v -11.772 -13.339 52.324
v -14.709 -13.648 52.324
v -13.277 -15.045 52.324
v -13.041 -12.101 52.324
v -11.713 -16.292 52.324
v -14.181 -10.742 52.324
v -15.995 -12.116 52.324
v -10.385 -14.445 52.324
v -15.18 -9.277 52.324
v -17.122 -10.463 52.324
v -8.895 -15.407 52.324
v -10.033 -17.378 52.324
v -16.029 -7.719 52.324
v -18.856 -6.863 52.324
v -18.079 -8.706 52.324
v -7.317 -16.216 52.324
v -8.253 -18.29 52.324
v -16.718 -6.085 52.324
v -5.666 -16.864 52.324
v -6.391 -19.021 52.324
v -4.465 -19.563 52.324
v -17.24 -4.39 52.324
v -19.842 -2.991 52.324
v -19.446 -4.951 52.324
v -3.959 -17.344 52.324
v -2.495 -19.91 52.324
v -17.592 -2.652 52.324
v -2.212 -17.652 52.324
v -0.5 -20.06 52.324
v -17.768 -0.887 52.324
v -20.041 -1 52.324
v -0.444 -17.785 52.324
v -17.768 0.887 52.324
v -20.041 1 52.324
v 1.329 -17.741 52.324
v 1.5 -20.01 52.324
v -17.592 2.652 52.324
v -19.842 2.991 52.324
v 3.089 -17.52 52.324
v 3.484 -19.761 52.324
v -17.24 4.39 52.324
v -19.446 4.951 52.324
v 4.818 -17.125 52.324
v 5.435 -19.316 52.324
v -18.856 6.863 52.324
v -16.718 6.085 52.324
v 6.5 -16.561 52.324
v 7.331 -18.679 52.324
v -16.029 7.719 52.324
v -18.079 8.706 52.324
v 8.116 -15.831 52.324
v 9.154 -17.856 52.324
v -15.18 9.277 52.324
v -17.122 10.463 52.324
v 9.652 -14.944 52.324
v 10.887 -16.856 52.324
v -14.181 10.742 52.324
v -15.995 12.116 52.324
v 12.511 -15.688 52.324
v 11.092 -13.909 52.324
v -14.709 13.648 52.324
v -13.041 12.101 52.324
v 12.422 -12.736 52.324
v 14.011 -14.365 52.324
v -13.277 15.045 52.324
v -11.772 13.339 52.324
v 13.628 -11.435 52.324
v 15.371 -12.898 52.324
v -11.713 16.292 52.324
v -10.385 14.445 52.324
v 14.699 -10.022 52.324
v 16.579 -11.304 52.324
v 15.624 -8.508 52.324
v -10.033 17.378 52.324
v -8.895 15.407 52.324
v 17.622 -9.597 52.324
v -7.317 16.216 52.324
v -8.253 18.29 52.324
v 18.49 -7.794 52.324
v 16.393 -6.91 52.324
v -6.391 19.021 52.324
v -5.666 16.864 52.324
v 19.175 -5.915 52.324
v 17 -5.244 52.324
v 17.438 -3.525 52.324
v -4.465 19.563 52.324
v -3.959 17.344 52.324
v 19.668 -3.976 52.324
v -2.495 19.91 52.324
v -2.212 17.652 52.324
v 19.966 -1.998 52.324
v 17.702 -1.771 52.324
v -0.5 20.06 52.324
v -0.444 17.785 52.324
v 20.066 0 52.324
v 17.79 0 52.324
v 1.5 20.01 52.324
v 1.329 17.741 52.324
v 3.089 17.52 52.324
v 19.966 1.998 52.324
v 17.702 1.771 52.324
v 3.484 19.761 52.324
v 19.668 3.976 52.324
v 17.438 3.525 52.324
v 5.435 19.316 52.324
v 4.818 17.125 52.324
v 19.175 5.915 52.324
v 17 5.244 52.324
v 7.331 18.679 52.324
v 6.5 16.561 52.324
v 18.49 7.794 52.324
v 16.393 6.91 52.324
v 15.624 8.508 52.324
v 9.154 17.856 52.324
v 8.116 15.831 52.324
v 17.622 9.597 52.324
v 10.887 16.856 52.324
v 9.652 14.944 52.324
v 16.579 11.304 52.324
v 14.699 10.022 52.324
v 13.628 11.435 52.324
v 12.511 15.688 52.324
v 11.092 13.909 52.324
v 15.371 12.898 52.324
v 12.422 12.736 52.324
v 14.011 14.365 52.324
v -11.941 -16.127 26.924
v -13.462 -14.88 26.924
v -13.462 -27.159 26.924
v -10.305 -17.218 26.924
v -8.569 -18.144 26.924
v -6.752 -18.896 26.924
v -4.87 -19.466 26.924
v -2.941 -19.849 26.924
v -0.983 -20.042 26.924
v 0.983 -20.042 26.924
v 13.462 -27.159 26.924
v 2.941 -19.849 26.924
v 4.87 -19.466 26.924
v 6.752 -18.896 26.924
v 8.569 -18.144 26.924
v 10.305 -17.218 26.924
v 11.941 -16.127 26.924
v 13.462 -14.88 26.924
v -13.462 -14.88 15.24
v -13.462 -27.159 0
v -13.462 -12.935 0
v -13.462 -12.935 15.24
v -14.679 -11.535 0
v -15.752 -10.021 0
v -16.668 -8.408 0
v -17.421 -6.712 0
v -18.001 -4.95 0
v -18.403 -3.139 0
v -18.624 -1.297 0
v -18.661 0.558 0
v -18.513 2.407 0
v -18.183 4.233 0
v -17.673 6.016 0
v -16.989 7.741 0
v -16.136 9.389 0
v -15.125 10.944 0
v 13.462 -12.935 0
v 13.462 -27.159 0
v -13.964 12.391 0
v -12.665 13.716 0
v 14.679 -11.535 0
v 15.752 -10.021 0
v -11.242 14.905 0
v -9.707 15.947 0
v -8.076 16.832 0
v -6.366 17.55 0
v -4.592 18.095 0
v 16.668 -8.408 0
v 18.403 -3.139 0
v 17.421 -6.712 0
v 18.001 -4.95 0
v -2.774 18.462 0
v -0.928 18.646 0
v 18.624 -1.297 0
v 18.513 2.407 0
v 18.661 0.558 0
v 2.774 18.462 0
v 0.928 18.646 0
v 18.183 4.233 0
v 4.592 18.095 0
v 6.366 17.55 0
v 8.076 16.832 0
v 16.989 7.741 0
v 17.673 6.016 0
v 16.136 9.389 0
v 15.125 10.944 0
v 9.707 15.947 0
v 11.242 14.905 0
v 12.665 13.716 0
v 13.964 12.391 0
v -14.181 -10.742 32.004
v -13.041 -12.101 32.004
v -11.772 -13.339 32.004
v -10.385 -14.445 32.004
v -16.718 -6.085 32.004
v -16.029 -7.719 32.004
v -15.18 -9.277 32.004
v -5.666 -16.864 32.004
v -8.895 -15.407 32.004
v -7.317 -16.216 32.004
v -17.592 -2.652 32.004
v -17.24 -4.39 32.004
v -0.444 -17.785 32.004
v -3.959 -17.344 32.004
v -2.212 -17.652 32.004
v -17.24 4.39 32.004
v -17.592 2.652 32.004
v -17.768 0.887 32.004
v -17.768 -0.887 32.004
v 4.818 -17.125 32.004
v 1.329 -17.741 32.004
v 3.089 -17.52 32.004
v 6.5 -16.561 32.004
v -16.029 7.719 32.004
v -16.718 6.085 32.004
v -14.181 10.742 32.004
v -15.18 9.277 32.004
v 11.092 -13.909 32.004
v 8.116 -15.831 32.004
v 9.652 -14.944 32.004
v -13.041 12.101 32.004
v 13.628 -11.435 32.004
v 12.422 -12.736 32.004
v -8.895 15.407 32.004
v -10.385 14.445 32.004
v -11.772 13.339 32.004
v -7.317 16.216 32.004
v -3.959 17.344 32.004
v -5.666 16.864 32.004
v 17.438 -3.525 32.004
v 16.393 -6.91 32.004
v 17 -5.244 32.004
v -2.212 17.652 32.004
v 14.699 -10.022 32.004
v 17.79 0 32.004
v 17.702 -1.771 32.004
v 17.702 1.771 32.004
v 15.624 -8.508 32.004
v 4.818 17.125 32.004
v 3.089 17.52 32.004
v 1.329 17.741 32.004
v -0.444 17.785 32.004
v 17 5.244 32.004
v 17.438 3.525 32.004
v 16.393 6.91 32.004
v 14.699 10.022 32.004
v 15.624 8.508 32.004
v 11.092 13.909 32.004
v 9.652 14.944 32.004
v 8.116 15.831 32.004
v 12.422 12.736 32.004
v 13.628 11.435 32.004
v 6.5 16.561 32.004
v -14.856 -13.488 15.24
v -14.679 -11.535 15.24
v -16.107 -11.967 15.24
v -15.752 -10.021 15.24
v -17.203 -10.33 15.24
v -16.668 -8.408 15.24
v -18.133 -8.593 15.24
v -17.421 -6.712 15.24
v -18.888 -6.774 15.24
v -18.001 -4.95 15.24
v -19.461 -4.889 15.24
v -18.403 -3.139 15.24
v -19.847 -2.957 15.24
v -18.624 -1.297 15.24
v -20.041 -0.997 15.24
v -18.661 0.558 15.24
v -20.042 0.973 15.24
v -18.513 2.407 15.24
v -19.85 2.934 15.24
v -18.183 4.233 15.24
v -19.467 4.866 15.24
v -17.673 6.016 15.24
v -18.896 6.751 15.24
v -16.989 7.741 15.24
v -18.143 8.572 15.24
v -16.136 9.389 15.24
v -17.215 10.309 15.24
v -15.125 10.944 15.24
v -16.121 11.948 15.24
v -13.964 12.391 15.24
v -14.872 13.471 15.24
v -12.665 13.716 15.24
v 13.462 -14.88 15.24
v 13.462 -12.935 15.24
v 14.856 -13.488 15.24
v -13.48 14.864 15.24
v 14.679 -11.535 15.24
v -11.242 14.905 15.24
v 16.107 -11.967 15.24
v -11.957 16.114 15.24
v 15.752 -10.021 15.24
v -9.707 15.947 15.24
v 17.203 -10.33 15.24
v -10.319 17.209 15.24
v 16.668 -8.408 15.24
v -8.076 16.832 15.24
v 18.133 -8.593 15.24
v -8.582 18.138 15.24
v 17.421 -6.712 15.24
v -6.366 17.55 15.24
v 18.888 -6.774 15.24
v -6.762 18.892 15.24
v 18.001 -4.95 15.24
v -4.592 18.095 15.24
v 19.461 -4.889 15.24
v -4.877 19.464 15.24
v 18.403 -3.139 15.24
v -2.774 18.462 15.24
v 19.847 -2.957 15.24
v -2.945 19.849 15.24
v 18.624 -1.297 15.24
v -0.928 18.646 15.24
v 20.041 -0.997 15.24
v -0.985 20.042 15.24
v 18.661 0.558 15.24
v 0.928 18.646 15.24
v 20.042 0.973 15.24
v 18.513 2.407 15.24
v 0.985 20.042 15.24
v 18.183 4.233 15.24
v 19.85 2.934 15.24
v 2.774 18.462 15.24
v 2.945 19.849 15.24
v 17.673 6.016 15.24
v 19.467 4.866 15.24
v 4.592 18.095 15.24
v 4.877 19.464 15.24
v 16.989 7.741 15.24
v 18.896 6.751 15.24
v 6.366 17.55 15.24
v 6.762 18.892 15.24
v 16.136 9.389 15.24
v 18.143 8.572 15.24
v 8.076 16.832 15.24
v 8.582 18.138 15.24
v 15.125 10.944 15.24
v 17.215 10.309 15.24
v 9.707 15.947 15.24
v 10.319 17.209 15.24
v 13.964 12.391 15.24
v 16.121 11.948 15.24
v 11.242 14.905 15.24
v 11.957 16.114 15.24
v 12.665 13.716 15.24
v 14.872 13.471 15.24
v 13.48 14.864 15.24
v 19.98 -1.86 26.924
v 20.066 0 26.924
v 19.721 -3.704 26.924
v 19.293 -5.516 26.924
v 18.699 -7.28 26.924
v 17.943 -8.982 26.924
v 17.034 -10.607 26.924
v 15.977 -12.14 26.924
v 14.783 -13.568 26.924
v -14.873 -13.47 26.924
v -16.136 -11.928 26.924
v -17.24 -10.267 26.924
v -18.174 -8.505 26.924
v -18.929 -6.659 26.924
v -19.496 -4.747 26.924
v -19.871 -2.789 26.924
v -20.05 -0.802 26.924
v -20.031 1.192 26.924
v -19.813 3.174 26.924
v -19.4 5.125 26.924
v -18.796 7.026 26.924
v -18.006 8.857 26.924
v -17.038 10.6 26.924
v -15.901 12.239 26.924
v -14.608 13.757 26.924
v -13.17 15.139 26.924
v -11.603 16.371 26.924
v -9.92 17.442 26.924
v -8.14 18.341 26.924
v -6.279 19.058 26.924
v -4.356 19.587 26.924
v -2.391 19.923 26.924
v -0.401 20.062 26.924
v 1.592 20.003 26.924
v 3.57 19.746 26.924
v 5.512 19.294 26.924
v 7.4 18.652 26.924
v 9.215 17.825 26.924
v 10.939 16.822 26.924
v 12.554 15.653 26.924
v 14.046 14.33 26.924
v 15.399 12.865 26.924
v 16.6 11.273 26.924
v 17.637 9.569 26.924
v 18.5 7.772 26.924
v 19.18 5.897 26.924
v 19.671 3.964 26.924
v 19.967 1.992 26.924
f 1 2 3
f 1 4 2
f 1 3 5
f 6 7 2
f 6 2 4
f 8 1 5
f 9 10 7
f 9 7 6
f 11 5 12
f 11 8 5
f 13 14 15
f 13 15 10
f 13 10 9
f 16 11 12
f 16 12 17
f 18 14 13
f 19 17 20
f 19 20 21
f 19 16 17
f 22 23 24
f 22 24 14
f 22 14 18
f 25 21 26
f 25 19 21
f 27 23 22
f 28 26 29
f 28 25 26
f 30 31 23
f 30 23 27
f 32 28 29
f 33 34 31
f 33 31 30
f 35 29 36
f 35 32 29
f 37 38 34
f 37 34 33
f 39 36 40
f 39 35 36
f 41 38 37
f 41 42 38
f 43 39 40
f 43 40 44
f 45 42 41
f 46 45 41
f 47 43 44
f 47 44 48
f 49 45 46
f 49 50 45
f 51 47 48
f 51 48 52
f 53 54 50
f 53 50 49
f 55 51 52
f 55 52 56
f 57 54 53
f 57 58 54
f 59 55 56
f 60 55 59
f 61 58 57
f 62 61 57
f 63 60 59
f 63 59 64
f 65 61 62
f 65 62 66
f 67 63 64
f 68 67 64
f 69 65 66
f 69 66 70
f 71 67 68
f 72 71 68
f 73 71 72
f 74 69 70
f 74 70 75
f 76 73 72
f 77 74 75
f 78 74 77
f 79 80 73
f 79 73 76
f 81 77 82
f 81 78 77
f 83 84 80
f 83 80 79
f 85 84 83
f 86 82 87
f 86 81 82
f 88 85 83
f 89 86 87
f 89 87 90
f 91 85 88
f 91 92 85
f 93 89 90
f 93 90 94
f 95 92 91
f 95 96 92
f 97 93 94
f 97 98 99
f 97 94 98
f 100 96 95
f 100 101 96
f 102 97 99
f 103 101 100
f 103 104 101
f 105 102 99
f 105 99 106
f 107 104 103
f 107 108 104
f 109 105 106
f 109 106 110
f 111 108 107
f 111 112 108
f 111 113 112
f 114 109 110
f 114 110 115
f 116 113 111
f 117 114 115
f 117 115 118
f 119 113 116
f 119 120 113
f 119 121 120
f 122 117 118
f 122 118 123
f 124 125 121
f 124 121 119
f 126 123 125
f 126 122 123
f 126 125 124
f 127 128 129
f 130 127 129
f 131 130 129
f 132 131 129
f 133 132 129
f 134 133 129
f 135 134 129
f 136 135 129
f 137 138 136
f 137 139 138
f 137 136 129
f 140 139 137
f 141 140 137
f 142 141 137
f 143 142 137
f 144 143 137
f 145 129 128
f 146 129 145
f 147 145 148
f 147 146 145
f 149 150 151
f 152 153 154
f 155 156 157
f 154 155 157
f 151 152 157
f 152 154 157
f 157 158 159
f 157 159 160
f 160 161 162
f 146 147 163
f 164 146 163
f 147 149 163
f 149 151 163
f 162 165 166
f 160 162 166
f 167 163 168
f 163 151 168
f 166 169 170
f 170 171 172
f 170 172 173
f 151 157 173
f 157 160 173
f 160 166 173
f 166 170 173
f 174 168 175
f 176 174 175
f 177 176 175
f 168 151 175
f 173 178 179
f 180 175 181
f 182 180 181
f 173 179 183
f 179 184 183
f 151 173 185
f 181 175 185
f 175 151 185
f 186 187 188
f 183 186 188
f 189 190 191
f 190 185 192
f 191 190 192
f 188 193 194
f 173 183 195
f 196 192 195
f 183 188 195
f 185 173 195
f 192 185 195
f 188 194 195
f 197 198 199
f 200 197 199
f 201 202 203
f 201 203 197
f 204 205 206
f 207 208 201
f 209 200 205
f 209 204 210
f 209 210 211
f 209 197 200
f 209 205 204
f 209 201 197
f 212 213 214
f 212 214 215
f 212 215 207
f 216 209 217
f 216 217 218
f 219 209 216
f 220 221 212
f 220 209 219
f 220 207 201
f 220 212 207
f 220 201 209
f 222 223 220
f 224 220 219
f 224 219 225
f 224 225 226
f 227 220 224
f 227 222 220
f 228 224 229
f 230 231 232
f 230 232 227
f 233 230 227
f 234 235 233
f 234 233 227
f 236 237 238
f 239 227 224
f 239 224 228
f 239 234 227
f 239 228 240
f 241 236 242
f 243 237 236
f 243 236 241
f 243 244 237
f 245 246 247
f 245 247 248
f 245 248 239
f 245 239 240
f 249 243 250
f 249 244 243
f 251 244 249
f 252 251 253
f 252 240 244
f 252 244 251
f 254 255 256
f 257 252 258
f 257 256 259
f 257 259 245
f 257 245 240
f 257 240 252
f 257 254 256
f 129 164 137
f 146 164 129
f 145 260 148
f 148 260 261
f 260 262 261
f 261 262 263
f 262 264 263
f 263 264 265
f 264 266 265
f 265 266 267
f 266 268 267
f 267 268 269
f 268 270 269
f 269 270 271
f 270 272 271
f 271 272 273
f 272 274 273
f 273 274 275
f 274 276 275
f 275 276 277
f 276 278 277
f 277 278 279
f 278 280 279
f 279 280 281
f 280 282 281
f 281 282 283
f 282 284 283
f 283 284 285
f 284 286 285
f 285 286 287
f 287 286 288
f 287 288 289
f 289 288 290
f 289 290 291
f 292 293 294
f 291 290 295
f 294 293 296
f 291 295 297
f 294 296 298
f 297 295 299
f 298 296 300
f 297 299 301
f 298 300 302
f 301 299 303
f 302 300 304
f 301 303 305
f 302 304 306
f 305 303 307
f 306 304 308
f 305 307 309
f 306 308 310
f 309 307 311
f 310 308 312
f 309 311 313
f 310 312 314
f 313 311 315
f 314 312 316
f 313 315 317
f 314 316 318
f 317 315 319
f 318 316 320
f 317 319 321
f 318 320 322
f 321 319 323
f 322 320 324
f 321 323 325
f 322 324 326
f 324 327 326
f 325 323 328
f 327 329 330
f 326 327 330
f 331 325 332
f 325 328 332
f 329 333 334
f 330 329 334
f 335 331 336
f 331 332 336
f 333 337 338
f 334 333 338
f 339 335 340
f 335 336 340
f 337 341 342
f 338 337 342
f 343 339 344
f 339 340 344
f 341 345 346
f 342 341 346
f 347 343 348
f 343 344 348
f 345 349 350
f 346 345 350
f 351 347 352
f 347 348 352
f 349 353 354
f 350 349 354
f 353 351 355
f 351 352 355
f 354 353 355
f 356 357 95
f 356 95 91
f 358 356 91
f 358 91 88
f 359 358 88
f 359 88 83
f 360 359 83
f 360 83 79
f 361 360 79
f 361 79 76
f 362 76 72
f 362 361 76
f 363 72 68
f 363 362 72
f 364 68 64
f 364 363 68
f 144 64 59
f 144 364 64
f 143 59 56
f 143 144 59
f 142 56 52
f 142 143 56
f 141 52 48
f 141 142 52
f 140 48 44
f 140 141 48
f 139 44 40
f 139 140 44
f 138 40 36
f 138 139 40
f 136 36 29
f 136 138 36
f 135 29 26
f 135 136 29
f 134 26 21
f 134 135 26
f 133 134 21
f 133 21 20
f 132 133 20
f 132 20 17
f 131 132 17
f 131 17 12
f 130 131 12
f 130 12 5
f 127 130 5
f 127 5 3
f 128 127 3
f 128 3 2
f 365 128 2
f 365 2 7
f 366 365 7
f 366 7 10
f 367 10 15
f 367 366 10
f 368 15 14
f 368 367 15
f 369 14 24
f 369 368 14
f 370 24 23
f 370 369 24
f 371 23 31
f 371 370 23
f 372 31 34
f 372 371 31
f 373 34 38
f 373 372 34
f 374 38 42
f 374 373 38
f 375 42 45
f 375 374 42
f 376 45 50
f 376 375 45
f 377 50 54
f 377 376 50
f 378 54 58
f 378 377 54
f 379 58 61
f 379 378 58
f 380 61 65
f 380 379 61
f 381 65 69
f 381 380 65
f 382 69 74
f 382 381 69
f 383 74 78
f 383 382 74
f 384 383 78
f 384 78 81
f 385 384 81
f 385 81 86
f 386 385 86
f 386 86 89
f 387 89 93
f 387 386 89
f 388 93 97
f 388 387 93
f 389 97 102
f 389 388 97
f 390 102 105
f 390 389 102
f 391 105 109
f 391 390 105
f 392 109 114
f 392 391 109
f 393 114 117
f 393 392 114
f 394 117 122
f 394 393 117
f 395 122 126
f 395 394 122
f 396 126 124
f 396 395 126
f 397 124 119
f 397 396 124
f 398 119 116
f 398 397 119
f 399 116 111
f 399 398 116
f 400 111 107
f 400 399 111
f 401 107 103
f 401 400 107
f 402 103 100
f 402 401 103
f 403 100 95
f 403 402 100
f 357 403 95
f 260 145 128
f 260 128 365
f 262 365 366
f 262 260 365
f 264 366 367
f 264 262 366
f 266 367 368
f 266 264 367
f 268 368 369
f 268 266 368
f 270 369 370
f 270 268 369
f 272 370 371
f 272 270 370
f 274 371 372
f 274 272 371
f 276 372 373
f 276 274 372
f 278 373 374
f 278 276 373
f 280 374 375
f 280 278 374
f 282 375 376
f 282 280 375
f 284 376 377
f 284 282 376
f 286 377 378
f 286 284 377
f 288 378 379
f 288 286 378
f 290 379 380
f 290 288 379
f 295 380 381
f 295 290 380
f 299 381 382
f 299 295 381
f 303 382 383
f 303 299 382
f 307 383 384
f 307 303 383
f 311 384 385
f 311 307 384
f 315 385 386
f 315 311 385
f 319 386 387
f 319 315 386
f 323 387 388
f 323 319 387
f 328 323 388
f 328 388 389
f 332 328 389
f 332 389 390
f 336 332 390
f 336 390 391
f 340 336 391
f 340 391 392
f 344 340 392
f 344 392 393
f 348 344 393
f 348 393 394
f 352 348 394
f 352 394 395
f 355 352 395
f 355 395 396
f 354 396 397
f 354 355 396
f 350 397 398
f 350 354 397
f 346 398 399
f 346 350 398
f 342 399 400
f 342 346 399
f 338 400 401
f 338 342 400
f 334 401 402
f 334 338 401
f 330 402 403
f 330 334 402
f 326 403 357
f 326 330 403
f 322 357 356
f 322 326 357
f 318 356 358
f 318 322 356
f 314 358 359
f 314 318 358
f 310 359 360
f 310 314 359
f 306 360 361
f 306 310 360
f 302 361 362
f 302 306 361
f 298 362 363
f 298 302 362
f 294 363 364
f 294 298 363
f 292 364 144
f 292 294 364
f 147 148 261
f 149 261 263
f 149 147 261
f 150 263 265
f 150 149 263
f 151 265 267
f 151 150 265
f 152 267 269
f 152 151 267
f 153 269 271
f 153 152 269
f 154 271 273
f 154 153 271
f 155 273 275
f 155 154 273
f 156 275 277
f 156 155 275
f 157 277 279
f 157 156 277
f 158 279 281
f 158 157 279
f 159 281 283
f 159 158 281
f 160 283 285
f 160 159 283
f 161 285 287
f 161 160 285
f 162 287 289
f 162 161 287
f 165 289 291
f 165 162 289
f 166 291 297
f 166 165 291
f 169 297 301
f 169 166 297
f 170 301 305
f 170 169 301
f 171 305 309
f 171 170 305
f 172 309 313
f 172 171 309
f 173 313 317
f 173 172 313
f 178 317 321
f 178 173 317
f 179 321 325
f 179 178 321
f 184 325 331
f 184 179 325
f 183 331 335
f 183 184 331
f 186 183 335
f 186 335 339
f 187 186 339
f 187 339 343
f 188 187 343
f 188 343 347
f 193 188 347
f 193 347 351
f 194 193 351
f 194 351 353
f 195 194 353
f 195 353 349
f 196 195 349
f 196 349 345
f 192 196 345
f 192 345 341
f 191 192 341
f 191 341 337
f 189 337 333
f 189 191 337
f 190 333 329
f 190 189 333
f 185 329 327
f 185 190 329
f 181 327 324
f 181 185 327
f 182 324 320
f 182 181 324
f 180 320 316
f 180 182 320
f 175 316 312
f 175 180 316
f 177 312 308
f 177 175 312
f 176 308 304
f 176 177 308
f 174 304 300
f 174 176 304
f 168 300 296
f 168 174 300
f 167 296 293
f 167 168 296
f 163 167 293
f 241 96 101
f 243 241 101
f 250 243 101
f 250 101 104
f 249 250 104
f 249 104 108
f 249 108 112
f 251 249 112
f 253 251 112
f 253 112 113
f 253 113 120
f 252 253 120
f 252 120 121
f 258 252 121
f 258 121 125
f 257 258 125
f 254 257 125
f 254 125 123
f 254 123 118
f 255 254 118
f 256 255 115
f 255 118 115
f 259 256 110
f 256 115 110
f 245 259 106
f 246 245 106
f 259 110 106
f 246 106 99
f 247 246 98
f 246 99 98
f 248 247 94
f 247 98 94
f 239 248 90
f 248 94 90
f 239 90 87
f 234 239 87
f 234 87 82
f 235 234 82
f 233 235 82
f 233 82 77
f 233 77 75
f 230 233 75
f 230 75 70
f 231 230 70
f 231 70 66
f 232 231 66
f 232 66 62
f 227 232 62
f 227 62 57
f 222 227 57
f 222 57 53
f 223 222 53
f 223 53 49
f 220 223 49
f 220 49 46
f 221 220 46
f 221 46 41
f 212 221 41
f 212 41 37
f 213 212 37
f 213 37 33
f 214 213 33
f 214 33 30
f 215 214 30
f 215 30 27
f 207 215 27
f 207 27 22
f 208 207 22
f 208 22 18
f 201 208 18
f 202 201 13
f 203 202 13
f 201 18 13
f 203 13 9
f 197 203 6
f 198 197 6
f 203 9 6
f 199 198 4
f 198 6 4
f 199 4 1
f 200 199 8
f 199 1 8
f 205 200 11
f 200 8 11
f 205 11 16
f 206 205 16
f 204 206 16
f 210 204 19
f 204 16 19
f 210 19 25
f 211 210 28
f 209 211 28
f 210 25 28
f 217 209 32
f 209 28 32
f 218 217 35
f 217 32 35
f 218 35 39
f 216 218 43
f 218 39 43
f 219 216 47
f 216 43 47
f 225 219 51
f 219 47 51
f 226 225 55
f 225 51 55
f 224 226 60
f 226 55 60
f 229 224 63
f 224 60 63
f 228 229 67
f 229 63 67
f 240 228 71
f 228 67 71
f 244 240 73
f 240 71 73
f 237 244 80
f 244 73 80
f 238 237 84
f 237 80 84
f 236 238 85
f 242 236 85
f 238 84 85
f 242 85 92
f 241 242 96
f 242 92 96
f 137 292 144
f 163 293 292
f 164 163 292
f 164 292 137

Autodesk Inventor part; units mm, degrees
ref_plane "YZ Plane" through (0, 0, 0) normal (1, 0, 0) x (0, 1, 0)
ref_plane "XZ Plane" through (0, 0, 0) normal (0, 1, 0) x (-1, 0, 0)
ref_plane "XY Plane" through (0, 0, 0) normal (0, 0, 1) x (1, 0, 0)
ref_plane "Work Plane1" through (0, 0, 0) normal (0, 0, 1) x (1, 0, 0)
sketch "Sketch1" plane through (0, 0, 0) normal (0, 0, 1) x (1, 0, 0)
  circle A0 centre (0, 0) radius 18.669
  line L0 (13.462, -27.1587) -> (-13.462, -27.1587)
  line L1 (-13.462, -27.1587) -> (-13.462, -12.9347)
  line L2 (-13.462, -12.9347) -> (13.462, -12.9347)
  line L3 (13.462, -12.9347) -> (13.462, -27.1587)
  dimension "d0" = 37.338
  dimension "d1" = 26.924
  dimension "d2" = 14.224
extrude "Extrusion1" add sketch "Sketch1" along normal blind 15.24
sketch "Sketch2" plane through (0, 0, 15.24) normal (0, 0, 1) x (1, 0, 0)
  line L0 (-13.462, -12.9347) -> (-13.462, -27.1587) projected
  line L1 (-13.462, -27.1587) -> (13.462, -27.1587) projected
  line L2 (13.462, -27.1587) -> (13.462, -12.9347) projected
  arc A0 (13.462, -12.9347) -> (-13.462, -12.9347) centre (0, 0) ccw projected
  circle A1 centre (0, 0) radius 20.066
  dimension "d5" = 40.132
extrude "Extrusion2" add sketch "Sketch2" along normal blind 11.684
sketch "Sketch3" plane through (0, 0, 26.924) normal (0, 0, 1) x (1, 0, 0)
  circle A0 centre (0, 0) radius 20.066
extrude "Extrusion3" add sketch "Sketch3" along normal blind 25.4
sketch "Sketch4" plane through (0, 0, 52.324) normal (0, 0, 1) x (1, 0, 0)
  circle A0 centre (0, 0) radius 20.066 projected
  circle A1 centre (0, 0) radius 17.7904
extrude "Extrusion4" cut sketch "Sketch4" against normal blind 20.32 contours A1
properties part number "dragonFlyLens" material "ABS Plastic"
